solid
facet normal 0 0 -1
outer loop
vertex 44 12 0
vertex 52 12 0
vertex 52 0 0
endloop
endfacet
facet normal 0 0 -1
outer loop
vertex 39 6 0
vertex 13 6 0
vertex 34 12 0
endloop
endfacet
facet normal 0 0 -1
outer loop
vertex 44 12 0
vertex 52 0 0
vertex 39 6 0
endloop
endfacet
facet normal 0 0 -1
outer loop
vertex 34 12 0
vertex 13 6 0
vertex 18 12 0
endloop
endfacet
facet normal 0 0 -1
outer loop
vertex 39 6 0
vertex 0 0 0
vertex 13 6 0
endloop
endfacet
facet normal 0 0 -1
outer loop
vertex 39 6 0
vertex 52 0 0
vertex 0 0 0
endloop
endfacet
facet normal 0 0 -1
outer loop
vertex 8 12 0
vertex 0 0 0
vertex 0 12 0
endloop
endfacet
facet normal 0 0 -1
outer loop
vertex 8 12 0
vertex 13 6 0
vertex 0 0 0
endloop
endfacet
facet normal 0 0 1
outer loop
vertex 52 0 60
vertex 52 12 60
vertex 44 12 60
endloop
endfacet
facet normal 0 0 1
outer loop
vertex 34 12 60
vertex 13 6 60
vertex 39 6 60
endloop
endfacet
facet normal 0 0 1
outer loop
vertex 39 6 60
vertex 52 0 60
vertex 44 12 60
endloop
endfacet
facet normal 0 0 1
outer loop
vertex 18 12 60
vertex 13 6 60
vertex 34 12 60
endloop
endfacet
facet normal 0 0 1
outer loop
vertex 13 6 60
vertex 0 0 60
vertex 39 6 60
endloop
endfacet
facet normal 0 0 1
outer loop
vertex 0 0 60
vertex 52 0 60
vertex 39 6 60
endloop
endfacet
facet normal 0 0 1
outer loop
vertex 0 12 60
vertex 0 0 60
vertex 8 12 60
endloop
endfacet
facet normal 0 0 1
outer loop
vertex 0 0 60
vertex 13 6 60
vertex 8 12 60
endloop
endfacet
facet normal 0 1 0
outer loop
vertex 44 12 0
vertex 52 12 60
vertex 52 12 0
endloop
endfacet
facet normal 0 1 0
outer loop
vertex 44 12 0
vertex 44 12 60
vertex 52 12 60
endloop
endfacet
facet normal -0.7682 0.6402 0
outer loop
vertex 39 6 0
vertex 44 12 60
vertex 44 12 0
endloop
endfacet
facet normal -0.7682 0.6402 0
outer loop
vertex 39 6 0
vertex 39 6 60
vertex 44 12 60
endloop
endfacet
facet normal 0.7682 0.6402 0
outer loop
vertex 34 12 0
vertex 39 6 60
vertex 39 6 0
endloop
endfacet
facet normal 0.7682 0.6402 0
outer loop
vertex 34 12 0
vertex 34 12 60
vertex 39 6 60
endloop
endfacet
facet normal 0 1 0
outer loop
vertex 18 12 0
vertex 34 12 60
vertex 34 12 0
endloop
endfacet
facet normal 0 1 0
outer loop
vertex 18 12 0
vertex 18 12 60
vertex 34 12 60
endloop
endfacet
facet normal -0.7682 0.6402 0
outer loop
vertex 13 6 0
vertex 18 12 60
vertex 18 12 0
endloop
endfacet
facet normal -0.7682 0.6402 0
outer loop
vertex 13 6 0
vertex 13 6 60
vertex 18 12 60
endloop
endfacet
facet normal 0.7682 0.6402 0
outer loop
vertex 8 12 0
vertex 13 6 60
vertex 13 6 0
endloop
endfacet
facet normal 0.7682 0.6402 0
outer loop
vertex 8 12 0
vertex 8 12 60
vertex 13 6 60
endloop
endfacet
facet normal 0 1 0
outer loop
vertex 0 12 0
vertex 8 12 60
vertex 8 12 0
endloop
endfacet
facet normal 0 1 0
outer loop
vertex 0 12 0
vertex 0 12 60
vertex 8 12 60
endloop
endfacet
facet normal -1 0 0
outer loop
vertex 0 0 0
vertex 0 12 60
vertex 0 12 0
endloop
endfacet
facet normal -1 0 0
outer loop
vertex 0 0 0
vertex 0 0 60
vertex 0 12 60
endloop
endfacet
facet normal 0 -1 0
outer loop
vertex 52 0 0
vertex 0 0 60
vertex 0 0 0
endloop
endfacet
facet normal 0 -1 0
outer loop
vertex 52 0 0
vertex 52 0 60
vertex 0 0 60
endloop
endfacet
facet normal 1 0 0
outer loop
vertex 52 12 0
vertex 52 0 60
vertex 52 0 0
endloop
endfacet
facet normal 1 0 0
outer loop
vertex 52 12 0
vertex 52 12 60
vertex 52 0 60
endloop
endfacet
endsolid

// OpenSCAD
$fn = 32;

// ----------------------------------------------------------------------
// V guide rail: doublev, 52 mm wide
// ----------------------------------------------------------------------

// --- parameters (mm) ---
rail_w = 52;              // rail width, X
base_t = 12;              // base plate thickness
v_depth = 6;              // V feature depth / height
v_half_w = 10;            // half width of the V at the base face
plate_t = 60;             // rail length, Z (the extrusion height)
groove_off = 13;          // offset of each groove from the centreline

centre_x = rail_w / 2;  // rail centreline
groove_a = centre_x - groove_off;  // axis of the first groove
groove_b = centre_x + groove_off;  // axis of the second groove

profile = [[0, 0], [52, 0], [52, 12], [44, 12], [39, 6], [34, 12], [18, 12], [13, 6], [8, 12], [0, 12]];  // primary outline, 10 points, counter clockwise

// --- the one profile operation ---
linear_extrude(height = plate_t) polygon(points = profile);
